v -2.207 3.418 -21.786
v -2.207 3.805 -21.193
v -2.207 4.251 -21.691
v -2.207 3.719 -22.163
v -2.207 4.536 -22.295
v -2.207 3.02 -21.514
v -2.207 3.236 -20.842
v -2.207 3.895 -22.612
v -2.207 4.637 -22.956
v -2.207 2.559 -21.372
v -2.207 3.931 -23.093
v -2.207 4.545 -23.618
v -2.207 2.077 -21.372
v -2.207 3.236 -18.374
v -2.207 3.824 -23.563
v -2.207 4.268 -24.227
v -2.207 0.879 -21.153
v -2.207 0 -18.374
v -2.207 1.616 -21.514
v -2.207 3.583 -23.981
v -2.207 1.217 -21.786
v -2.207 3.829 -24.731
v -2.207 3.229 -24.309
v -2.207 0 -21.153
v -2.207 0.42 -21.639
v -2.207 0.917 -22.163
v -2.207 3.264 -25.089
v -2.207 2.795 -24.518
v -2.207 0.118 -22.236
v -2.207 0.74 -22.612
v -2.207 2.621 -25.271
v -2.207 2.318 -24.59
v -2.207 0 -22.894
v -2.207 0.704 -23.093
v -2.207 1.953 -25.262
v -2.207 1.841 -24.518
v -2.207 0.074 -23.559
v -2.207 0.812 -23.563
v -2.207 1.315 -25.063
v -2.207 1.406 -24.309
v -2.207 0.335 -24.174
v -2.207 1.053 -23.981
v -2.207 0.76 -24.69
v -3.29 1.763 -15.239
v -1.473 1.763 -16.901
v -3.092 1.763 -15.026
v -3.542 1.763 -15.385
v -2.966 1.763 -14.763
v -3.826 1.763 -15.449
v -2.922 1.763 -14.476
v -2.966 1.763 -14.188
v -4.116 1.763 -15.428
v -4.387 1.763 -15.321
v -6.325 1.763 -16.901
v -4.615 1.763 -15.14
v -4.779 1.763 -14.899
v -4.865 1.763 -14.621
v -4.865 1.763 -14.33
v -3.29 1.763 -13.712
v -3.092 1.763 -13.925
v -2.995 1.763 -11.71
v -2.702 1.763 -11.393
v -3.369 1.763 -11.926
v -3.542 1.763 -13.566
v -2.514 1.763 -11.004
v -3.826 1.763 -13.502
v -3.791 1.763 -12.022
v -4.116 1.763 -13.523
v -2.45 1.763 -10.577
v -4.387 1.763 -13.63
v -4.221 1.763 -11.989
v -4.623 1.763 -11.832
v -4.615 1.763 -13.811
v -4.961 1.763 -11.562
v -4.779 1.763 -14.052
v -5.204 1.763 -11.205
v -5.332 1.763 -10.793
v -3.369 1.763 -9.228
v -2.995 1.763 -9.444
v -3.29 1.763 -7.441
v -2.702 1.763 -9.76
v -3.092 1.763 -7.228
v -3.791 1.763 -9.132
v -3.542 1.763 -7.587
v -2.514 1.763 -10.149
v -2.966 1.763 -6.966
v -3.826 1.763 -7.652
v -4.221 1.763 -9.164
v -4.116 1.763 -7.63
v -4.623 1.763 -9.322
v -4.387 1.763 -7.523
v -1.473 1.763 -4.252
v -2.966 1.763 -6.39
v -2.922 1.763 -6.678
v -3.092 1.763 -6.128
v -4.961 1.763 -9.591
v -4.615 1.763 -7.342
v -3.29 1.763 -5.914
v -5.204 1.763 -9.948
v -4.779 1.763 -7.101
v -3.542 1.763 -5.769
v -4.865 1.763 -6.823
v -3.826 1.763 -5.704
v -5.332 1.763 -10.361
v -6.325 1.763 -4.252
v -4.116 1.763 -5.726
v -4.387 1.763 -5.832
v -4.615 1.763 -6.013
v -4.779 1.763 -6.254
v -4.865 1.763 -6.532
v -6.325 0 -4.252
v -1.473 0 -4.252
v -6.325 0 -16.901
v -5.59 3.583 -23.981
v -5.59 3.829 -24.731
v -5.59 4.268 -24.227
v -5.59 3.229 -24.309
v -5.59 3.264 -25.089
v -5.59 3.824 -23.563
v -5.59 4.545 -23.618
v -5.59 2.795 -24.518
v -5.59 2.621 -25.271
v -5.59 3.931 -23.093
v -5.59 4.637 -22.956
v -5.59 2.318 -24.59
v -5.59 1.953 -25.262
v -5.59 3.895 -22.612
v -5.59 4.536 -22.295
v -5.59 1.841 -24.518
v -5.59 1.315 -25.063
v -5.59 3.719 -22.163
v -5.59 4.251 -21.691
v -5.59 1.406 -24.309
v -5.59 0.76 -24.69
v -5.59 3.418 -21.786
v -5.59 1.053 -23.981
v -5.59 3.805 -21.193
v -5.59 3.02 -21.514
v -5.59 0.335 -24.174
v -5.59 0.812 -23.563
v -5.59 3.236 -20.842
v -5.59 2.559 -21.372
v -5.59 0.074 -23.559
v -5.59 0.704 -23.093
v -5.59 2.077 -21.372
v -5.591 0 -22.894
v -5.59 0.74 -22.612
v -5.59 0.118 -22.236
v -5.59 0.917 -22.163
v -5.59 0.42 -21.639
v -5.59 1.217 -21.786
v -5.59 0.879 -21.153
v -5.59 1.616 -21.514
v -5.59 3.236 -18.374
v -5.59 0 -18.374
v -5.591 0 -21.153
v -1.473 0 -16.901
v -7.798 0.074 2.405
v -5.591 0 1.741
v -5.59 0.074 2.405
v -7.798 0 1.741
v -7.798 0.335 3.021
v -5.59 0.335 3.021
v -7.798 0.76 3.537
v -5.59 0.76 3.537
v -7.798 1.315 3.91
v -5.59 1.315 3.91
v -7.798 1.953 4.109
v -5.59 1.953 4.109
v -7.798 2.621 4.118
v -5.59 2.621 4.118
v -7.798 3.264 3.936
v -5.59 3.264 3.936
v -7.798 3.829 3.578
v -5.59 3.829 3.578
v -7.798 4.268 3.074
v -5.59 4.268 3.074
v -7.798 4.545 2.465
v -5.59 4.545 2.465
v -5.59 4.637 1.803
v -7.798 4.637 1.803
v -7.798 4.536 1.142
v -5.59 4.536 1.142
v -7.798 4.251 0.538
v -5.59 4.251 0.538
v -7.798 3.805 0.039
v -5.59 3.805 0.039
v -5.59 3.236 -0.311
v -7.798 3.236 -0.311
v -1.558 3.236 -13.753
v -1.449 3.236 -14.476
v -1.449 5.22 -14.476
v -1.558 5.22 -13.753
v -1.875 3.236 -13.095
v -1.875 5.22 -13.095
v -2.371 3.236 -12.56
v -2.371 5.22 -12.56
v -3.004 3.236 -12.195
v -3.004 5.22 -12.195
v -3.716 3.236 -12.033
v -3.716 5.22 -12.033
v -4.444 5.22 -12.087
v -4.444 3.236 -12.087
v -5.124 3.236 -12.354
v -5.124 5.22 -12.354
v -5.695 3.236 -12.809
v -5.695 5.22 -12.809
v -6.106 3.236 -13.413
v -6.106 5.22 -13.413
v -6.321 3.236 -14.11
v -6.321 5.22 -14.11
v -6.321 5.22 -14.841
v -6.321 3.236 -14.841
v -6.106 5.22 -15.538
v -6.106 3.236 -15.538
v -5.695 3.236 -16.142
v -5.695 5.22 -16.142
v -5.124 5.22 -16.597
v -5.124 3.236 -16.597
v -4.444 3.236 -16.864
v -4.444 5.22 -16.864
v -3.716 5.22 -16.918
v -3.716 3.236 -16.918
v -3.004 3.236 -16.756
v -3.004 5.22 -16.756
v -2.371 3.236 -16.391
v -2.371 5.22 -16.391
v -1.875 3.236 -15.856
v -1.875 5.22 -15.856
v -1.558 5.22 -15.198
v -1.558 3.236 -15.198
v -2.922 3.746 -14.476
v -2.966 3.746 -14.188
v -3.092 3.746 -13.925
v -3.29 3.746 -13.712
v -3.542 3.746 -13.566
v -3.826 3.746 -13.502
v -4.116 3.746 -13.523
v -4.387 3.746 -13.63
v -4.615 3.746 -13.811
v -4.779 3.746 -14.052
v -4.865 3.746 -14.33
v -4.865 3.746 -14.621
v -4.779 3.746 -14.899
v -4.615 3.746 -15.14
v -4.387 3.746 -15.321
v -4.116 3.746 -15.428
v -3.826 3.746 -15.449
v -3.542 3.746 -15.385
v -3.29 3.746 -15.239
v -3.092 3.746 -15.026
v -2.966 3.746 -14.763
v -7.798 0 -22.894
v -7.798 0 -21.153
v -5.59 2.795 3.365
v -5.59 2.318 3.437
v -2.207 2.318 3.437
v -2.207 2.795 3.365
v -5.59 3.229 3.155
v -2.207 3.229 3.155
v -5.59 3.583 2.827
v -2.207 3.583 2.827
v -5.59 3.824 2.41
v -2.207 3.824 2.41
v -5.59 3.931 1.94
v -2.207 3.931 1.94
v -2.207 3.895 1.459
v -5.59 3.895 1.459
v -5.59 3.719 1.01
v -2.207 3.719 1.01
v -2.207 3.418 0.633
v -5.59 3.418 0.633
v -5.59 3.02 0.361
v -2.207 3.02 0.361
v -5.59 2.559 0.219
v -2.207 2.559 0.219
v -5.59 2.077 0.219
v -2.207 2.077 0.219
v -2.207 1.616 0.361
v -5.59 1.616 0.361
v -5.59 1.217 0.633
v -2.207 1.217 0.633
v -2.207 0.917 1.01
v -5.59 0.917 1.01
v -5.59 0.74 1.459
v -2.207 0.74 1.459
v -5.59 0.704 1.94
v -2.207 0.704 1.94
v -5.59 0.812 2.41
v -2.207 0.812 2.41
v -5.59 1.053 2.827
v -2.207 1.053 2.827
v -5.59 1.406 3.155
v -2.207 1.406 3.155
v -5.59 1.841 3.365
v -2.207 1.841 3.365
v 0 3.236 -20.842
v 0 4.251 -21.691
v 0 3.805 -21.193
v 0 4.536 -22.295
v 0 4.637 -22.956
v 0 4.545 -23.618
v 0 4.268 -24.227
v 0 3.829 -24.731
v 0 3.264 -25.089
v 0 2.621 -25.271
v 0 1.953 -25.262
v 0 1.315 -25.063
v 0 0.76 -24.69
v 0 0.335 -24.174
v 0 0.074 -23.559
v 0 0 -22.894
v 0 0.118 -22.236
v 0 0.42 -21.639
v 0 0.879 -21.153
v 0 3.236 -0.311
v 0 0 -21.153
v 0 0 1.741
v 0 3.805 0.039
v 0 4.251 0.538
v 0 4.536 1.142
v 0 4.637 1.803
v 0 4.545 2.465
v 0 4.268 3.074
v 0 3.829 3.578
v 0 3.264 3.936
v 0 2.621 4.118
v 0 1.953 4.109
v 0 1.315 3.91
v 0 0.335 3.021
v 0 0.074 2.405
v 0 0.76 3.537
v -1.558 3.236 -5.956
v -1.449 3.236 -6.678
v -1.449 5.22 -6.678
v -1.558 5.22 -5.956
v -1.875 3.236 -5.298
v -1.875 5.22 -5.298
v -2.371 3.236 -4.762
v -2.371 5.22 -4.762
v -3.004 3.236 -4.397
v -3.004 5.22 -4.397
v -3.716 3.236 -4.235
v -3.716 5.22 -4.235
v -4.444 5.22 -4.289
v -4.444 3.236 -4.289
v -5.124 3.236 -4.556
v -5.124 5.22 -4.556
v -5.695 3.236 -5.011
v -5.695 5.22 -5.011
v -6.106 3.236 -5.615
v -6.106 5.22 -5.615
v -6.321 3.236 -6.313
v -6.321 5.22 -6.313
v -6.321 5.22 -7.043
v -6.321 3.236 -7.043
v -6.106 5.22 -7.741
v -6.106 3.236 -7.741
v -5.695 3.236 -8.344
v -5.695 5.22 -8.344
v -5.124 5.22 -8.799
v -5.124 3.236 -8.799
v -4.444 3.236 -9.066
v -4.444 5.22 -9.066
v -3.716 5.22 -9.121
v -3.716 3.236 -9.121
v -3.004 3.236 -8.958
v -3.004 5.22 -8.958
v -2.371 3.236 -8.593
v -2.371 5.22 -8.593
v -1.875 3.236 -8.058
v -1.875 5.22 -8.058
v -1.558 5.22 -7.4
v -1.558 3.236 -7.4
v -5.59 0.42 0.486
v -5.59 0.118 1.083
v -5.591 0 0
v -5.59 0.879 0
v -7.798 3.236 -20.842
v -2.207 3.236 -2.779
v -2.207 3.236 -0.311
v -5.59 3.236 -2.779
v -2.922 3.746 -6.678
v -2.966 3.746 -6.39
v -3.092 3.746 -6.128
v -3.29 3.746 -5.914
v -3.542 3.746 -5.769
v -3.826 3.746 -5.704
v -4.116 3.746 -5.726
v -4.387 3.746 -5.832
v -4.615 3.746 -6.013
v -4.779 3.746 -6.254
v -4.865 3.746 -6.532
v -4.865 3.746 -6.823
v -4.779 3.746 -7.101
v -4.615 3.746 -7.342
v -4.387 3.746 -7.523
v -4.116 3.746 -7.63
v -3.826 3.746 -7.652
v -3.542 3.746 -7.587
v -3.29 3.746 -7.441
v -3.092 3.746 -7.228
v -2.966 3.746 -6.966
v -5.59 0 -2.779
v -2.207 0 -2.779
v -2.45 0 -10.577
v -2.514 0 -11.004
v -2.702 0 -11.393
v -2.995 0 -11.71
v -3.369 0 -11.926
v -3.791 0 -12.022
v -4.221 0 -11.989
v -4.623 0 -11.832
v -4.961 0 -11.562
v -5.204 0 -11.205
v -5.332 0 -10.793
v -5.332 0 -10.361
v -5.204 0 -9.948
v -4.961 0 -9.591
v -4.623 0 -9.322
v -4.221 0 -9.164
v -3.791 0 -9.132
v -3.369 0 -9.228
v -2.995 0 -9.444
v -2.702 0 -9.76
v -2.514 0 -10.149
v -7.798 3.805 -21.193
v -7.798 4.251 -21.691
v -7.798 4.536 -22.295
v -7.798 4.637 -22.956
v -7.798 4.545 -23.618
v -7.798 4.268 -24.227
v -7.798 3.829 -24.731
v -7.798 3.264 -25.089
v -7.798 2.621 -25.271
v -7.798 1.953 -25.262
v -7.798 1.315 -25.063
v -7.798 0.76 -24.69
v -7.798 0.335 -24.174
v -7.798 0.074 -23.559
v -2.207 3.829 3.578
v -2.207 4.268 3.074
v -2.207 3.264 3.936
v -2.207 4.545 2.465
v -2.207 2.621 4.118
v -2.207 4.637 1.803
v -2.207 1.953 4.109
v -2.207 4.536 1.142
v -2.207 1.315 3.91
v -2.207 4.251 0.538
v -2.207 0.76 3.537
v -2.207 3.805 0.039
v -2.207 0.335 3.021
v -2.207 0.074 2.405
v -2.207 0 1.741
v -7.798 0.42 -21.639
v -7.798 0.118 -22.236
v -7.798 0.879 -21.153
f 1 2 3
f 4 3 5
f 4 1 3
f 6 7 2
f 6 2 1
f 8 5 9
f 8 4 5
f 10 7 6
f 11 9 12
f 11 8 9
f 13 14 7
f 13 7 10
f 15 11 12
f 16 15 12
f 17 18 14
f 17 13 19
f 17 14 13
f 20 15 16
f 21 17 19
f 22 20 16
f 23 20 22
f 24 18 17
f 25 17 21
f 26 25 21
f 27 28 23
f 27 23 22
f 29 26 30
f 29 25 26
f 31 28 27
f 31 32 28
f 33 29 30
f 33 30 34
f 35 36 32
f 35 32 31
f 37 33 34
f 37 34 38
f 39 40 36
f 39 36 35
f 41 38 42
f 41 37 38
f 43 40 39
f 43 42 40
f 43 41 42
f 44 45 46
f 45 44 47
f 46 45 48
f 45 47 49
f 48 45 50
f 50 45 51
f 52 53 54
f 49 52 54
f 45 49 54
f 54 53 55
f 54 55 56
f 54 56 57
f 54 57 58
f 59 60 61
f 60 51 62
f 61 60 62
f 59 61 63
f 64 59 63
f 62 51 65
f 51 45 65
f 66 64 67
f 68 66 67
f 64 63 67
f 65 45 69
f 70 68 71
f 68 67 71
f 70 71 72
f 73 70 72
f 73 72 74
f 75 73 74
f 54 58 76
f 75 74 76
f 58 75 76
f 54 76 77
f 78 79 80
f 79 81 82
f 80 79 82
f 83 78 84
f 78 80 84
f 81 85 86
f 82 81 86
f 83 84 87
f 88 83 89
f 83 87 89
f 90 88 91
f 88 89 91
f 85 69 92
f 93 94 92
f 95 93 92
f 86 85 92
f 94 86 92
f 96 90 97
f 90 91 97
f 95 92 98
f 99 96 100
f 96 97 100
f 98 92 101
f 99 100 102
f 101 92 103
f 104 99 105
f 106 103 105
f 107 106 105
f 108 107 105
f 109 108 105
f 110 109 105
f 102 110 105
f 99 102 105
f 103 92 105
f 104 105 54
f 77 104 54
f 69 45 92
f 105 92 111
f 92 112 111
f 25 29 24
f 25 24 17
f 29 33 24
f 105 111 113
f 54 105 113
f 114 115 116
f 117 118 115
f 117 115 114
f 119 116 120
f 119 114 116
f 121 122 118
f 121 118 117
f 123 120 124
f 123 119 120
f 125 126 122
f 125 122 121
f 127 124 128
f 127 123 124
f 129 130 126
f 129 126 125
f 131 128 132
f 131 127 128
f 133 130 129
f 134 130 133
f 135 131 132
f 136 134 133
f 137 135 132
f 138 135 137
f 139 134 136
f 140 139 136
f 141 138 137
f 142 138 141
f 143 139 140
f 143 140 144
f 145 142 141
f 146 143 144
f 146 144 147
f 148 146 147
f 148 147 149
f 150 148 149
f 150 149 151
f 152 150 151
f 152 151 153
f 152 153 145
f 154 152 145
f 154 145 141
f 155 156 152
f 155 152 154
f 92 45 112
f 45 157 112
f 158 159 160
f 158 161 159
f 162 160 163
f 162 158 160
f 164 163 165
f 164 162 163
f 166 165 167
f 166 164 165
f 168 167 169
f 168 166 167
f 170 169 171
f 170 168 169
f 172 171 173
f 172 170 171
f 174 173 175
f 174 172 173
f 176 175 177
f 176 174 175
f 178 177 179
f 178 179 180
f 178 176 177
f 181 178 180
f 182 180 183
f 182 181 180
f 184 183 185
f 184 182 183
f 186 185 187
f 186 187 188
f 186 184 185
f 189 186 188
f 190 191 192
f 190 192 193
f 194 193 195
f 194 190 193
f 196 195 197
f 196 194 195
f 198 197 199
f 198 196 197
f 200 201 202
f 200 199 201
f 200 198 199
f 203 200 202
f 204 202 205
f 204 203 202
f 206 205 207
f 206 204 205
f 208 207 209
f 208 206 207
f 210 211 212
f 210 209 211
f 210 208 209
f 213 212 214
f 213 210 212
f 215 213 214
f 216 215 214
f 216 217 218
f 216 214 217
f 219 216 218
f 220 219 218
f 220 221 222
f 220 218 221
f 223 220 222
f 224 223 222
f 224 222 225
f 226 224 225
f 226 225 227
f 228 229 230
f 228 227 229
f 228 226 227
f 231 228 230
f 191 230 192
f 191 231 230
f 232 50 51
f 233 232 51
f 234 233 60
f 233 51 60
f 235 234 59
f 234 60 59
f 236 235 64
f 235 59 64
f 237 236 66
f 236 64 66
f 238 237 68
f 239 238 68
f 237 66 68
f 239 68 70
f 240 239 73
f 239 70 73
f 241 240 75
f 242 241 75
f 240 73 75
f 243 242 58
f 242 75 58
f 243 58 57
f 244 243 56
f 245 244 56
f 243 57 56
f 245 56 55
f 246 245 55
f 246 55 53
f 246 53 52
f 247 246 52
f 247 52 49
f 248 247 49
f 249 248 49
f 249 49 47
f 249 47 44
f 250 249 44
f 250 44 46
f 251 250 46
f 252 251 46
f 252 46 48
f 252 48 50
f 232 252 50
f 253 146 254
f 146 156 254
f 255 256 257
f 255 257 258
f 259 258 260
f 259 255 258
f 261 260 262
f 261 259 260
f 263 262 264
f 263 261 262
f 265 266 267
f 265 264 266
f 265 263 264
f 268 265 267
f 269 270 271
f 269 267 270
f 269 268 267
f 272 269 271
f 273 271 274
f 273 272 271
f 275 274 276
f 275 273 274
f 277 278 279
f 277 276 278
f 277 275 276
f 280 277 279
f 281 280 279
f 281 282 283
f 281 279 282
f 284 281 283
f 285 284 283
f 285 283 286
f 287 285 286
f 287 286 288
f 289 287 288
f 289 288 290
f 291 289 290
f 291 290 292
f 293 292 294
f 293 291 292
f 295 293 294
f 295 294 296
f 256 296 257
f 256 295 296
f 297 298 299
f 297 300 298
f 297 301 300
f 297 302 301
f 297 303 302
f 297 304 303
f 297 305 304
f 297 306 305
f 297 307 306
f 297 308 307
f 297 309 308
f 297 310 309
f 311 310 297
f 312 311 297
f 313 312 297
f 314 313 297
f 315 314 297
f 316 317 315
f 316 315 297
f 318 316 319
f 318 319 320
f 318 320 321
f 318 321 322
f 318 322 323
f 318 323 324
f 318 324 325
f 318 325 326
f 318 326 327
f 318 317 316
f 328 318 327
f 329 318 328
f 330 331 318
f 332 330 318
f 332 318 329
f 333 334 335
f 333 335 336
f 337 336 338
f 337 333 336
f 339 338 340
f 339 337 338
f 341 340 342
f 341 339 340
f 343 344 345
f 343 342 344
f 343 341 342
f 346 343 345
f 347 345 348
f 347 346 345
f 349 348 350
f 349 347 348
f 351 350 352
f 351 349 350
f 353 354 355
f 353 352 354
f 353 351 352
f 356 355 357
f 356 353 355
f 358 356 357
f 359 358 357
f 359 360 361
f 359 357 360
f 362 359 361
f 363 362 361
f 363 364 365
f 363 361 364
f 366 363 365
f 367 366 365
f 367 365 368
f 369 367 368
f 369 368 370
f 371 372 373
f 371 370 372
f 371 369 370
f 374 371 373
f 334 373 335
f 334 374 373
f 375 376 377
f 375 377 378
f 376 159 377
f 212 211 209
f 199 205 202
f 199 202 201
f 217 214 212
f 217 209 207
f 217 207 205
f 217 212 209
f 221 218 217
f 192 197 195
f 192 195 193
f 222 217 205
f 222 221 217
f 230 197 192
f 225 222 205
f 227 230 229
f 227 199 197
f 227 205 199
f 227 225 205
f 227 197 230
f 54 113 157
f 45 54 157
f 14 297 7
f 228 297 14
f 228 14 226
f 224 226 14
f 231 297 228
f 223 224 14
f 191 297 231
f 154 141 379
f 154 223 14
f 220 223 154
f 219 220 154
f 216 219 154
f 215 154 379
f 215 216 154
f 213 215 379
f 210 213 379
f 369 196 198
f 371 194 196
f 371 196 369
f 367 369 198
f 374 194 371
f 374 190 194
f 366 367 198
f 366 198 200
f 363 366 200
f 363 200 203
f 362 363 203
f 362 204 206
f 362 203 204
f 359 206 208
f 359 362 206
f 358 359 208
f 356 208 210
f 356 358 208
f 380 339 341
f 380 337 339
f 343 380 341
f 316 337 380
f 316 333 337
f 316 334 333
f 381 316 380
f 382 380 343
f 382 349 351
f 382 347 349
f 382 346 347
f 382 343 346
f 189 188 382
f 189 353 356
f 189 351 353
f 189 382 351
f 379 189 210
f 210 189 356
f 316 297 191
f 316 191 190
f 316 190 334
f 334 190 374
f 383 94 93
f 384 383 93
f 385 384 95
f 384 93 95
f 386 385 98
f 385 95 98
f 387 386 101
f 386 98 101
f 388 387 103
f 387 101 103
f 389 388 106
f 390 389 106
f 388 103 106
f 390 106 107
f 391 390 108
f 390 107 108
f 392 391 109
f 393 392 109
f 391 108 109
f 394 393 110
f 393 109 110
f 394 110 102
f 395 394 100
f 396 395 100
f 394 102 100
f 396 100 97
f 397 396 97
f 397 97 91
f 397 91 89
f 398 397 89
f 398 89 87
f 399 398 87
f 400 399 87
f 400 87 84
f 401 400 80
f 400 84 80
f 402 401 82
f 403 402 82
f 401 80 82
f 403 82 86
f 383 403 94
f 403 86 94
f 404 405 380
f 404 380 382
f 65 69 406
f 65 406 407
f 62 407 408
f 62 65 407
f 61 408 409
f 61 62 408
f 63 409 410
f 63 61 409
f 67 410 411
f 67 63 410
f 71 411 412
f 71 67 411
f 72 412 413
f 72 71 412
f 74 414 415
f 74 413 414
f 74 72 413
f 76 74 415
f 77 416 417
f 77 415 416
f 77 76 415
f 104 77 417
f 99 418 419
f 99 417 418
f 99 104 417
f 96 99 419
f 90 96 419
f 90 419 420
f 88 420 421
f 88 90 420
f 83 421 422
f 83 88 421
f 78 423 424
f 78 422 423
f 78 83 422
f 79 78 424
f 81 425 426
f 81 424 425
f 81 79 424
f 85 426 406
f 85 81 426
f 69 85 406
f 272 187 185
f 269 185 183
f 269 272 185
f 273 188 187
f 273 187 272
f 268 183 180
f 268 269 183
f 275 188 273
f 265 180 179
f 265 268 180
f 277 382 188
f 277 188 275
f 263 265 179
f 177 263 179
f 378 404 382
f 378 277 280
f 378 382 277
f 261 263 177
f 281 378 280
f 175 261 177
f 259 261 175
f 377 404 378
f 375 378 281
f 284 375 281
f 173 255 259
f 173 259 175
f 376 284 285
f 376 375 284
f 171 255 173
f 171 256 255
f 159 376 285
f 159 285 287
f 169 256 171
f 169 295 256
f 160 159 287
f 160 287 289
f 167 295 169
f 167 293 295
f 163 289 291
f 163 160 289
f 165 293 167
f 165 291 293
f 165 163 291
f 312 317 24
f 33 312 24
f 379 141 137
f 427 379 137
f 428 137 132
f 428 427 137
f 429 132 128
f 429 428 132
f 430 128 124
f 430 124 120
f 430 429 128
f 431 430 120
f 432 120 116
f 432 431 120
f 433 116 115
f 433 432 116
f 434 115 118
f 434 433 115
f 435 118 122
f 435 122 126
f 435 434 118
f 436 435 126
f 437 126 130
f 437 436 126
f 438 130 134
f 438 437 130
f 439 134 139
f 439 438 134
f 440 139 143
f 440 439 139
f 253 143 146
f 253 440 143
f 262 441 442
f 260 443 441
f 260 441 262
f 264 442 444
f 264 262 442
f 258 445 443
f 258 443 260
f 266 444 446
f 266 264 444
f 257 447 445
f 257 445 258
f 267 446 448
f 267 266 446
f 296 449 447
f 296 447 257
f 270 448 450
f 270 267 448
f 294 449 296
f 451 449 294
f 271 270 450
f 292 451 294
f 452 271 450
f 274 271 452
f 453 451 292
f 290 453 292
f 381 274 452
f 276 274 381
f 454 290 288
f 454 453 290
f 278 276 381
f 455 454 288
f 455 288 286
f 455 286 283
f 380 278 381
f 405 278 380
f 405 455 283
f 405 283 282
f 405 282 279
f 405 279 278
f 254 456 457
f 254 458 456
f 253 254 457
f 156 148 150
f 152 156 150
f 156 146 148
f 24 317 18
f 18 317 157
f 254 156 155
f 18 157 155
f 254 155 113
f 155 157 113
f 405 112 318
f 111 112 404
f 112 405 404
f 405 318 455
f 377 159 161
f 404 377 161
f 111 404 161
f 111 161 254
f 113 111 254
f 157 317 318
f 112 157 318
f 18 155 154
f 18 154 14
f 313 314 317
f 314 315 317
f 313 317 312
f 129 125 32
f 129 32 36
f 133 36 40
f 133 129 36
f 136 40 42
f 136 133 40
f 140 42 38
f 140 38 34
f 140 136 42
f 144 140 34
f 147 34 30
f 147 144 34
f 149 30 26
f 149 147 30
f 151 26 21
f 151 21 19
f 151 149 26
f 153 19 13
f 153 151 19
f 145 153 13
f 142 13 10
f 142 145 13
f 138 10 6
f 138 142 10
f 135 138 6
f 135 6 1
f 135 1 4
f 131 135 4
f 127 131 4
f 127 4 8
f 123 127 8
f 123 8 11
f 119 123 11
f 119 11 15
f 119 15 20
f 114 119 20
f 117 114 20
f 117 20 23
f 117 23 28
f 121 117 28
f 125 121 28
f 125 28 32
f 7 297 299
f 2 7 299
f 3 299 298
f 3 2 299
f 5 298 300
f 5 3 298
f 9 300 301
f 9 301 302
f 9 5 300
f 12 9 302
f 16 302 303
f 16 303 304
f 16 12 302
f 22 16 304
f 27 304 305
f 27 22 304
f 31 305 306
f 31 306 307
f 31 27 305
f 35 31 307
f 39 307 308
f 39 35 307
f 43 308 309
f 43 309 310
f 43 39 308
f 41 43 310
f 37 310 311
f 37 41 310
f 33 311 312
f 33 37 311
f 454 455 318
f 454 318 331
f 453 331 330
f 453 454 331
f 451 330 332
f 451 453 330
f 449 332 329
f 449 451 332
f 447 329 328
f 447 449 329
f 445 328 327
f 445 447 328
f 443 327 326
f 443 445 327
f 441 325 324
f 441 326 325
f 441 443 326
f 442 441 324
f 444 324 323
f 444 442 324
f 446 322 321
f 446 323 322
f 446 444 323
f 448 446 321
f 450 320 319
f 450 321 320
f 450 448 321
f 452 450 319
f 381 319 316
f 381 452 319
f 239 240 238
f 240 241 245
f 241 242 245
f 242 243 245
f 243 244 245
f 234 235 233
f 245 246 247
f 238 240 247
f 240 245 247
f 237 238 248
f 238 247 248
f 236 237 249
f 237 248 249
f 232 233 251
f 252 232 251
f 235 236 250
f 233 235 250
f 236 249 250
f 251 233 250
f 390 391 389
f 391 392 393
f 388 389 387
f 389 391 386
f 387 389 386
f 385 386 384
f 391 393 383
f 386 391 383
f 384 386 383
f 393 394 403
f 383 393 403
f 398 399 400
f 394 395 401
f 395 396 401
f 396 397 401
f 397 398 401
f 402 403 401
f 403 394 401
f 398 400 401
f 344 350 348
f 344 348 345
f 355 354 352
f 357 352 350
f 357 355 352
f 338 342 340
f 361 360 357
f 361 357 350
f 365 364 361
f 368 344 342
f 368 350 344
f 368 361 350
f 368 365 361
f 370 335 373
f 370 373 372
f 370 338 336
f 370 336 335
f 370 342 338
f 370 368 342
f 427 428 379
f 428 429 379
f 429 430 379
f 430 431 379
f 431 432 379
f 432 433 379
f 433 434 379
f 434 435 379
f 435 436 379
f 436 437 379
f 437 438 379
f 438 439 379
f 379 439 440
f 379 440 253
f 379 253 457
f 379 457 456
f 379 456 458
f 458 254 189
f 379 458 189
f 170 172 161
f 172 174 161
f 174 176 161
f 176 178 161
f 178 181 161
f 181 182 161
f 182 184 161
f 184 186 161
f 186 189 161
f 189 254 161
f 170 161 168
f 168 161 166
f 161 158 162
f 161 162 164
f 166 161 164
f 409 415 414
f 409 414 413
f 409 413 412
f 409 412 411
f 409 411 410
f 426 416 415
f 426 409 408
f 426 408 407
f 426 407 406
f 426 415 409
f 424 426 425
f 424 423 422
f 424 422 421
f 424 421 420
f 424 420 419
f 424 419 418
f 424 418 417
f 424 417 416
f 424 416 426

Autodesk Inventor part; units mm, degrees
ref_plane "YZ Plane" through (0, 0, 0) normal (1, 0, 0) x (0, 1, 0)
sketch "Sketch1" plane through (0, 0, 0) normal (0, 1, 0) x (-1, 0, 0)
  line L0 (0, 0) -> (7.7978, 0) construction
  line L1 (7.7978, 0) -> (7.7978, -21.1531) construction
  line L2 (7.7978, -21.1531) -> (0, -21.1531) construction
  line L3 (0, -21.1531) -> (0, 0) construction
  line L4 (7.7978, -10.5766) -> (7.7978, -2.7788) construction
  line L5 (7.7978, -2.7788) -> (0, -2.7788) construction
  line L6 (0, -2.7788) -> (0, -18.3744) construction
  line L7 (0, -18.3744) -> (7.7978, -18.3744) construction
  line L8 (7.7978, -18.3744) -> (7.7978, -2.7788) construction
  line L9 (7.7978, 0) -> (5.5905, 0) construction
  line L10 (5.5905, 0) -> (5.5905, -2.7788) construction
  line L11 (5.5905, -2.7788) -> (7.7978, -2.7788) construction
  line L12 (7.7978, -2.7788) -> (7.7978, 0) construction
  line L13 (7.7978, -10.5766) -> (0, -10.5766) construction
  line L14 (5.5905, -21.1531) -> (5.5905, -18.3744) construction
  line L15 (3.8989, 0) -> (3.8989, -21.1531) construction
  line L16 (2.2073, 0) -> (2.2073, -2.7788) construction
  line L17 (2.2073, -21.1531) -> (2.2073, -18.3744) construction
  line L18 (7.7978, 0) -> (7.7978, -21.1531)
  line L19 (7.7978, -21.1531) -> (5.5905, -21.1531)
  line L20 (5.5905, -21.1531) -> (5.5905, -18.3744)
  line L21 (5.5905, -18.3744) -> (2.2073, -18.3744)
  line L22 (2.2073, -18.3744) -> (2.2073, -21.1531)
  line L23 (2.2073, -21.1531) -> (0, -21.1531)
  line L24 (0, -21.1531) -> (0, 0)
  line L25 (0, 0) -> (2.2073, 0)
  line L26 (2.2073, 0) -> (2.2073, -2.7788)
  line L27 (2.2073, -2.7788) -> (5.5905, -2.7788)
  line L28 (5.5905, -2.7788) -> (5.5905, 0)
  line L29 (5.5905, 0) -> (7.7978, 0)
  dimension "d0" = 7.7978
  dimension "d1" = 21.1531
  dimension "d2" = 7.7978
  dimension "d3" = 7.7978
  dimension "d4" = 15.5956
  dimension "d5" = 2.2073
extrude "Extrusion1" add sketch "Sketch1" along normal blind 3.236
sketch "Sketch2" plane through (0, 3.236, 0) normal (0, 1, 0) x (1, 0, 0)
  line L0 (0, 0) -> (0, 21.1531) construction
  line L1 (0, 10.5766) -> (-7.7978, 10.5766) construction
  line L2 (-7.7978, 21.1531) -> (-7.7978, 0) construction
  line L3 (0, 10.5766) -> (-3.8989, 10.5766) construction
  line L4 (-3.8989, 10.5766) -> (-3.8989, 6.6777) construction
  line L5 (-3.8989, 6.6777) -> (0, 6.6777) construction
  line L6 (0, 6.6777) -> (0, 10.5766) construction
  circle A0 centre (-3.8989, 6.6777) radius 2.4498
  dimension "d8" = 3.8989
  dimension "d9" = 3.8989
  dimension "d10" = 4.8997
extrude "Extrusion2" add sketch "Sketch2" along normal blind 1.9837
pattern_linear "Rectangular Pattern1" count 2 spacing 7.7978 along (0, 0, -1) of "Extrusion2"
shell "Shell1" thickness 1.4732 removed faces 1 at (-3.335, 0, -7.9773)
sketch "Sketch3" plane through (-6.3246, 1.7628, -16.9012) normal (0, -1, 0) x (1, 0, 0)
  circle A0 centre (2.4257, 10.2235) radius 2.4498 construction
  circle A1 centre (2.4257, 2.4257) radius 2.4498 construction
  line L0 (2.4257, 10.2235) -> (2.4257, 2.4257) construction
  circle A2 centre (2.4257, 6.3246) radius 1.4491
  point P0 (6.3246, 16.9012)
extrude "Extrusion3" add sketch "Sketch3" along normal up to surface (1.7628 mm away)
ref_plane "Work Plane1" through (0, 2.3178, 0) normal (0, -1, 0) x (1, 0, 0)
sketch "Sketch5" plane through (0, 2.3178, 0) normal (0, -1, 0) x (1, 0, 0)
  line L0 (-7.7978, -21.1531) -> (-7.7978, 0) construction
  line L1 (-7.7978, 0) -> (-7.7978, 1.8186) construction
  line L2 (-7.7978, 0) -> (-5.9792, 0) construction
  line L3 (-7.7978, 1.8186) -> (0, 1.8186) construction
  line L4 (0, 1.8186) -> (0, 4.1377) construction
  line L5 (0, 4.1377) -> (-7.7978, 4.1377) construction
  line L6 (-7.7978, 4.1377) -> (-7.7978, 1.8186) construction
  line L7 (-7.7978, 4.1377) -> (-5.5905, 4.1377) construction
  line L8 (-7.7978, 4.1377) -> (-5.5905, 4.1377) construction
  line L9 (-5.5905, 4.1377) -> (-2.2073, 4.1377) construction
  line L10 (-2.2073, 4.1377) -> (-2.2073, 3.4366) construction
  line L11 (-2.2073, 3.4366) -> (-5.5905, 3.4366) construction
  line L12 (-5.5905, 3.4366) -> (-5.5905, 4.1377) construction
  line L13 (-7.7978, 1.8186) -> (0, 1.8186)
  line L14 (0, 1.8186) -> (0, 4.1377)
  line L15 (0, 4.1377) -> (-2.2073, 4.1377)
  line L16 (-2.2073, 4.1377) -> (-2.2073, 3.4366)
  line L17 (-2.2073, 3.4366) -> (-5.5905, 3.4366)
  line L18 (-5.5905, 3.4366) -> (-5.5905, 4.1377)
  line L19 (-5.5905, 4.1377) -> (-7.7978, 4.1377)
  line L20 (-7.7978, 4.1377) -> (-7.7978, 1.8186)
  dimension "d28" = 1.8186
  dimension "d29" = 90
  dimension "d30" = 7.7978
  dimension "d31" = 2.319
  dimension "d32" = 2.2073
  dimension "d33" = 0
  dimension "d34" = 3.3833
  dimension "d35" = 0.701
revolve "Revolution1" add sketch "Sketch5" angle 360 about axis through (-7.7978, 2.3178, 1.8186) along (1, 0, 0)
sketch "Sketch6" plane through (-2.2073, 0, 0) normal (0, 0, 1) x (1, 0, 0)
  line L0 (2.2073, 0) -> (0, 0) projected
  line L1 (0, 0) -> (0, 3.236) projected
  line L2 (2.2073, 0) -> (0, 0)
  line L3 (0, 0) -> (0, 3.236)
  line L4 (0, 3.236) -> (2.2073, 3.236)
  line L5 (2.2073, 3.236) -> (2.2073, 0)
  line L6 (-3.3833, 0) -> (-5.5905, 0) projected
  line L7 (-3.3833, 0) -> (-3.3833, 3.236) projected
  line L8 (-5.5905, 0) -> (-3.3833, 0)
  line L9 (-3.3833, 0) -> (-3.3833, 3.236)
  line L10 (-3.3833, 3.236) -> (-5.5905, 3.236)
  line L11 (-5.5905, 3.236) -> (-5.5905, 0)
extrude "Extrusion4" add sketch "Sketch6" along normal up to surface
ref_plane "Work Plane2" through (-5.5905, 0, -10.5766) normal (0, 0, 1) x (1, 0, 0)
mirror "Mirror1" about plane through (-5.5905, 0, -10.5766) normal (0, 0, 1) of "Revolution1", "Extrusion4"
properties part number "Weird circle things" material "ABS Plastic"
